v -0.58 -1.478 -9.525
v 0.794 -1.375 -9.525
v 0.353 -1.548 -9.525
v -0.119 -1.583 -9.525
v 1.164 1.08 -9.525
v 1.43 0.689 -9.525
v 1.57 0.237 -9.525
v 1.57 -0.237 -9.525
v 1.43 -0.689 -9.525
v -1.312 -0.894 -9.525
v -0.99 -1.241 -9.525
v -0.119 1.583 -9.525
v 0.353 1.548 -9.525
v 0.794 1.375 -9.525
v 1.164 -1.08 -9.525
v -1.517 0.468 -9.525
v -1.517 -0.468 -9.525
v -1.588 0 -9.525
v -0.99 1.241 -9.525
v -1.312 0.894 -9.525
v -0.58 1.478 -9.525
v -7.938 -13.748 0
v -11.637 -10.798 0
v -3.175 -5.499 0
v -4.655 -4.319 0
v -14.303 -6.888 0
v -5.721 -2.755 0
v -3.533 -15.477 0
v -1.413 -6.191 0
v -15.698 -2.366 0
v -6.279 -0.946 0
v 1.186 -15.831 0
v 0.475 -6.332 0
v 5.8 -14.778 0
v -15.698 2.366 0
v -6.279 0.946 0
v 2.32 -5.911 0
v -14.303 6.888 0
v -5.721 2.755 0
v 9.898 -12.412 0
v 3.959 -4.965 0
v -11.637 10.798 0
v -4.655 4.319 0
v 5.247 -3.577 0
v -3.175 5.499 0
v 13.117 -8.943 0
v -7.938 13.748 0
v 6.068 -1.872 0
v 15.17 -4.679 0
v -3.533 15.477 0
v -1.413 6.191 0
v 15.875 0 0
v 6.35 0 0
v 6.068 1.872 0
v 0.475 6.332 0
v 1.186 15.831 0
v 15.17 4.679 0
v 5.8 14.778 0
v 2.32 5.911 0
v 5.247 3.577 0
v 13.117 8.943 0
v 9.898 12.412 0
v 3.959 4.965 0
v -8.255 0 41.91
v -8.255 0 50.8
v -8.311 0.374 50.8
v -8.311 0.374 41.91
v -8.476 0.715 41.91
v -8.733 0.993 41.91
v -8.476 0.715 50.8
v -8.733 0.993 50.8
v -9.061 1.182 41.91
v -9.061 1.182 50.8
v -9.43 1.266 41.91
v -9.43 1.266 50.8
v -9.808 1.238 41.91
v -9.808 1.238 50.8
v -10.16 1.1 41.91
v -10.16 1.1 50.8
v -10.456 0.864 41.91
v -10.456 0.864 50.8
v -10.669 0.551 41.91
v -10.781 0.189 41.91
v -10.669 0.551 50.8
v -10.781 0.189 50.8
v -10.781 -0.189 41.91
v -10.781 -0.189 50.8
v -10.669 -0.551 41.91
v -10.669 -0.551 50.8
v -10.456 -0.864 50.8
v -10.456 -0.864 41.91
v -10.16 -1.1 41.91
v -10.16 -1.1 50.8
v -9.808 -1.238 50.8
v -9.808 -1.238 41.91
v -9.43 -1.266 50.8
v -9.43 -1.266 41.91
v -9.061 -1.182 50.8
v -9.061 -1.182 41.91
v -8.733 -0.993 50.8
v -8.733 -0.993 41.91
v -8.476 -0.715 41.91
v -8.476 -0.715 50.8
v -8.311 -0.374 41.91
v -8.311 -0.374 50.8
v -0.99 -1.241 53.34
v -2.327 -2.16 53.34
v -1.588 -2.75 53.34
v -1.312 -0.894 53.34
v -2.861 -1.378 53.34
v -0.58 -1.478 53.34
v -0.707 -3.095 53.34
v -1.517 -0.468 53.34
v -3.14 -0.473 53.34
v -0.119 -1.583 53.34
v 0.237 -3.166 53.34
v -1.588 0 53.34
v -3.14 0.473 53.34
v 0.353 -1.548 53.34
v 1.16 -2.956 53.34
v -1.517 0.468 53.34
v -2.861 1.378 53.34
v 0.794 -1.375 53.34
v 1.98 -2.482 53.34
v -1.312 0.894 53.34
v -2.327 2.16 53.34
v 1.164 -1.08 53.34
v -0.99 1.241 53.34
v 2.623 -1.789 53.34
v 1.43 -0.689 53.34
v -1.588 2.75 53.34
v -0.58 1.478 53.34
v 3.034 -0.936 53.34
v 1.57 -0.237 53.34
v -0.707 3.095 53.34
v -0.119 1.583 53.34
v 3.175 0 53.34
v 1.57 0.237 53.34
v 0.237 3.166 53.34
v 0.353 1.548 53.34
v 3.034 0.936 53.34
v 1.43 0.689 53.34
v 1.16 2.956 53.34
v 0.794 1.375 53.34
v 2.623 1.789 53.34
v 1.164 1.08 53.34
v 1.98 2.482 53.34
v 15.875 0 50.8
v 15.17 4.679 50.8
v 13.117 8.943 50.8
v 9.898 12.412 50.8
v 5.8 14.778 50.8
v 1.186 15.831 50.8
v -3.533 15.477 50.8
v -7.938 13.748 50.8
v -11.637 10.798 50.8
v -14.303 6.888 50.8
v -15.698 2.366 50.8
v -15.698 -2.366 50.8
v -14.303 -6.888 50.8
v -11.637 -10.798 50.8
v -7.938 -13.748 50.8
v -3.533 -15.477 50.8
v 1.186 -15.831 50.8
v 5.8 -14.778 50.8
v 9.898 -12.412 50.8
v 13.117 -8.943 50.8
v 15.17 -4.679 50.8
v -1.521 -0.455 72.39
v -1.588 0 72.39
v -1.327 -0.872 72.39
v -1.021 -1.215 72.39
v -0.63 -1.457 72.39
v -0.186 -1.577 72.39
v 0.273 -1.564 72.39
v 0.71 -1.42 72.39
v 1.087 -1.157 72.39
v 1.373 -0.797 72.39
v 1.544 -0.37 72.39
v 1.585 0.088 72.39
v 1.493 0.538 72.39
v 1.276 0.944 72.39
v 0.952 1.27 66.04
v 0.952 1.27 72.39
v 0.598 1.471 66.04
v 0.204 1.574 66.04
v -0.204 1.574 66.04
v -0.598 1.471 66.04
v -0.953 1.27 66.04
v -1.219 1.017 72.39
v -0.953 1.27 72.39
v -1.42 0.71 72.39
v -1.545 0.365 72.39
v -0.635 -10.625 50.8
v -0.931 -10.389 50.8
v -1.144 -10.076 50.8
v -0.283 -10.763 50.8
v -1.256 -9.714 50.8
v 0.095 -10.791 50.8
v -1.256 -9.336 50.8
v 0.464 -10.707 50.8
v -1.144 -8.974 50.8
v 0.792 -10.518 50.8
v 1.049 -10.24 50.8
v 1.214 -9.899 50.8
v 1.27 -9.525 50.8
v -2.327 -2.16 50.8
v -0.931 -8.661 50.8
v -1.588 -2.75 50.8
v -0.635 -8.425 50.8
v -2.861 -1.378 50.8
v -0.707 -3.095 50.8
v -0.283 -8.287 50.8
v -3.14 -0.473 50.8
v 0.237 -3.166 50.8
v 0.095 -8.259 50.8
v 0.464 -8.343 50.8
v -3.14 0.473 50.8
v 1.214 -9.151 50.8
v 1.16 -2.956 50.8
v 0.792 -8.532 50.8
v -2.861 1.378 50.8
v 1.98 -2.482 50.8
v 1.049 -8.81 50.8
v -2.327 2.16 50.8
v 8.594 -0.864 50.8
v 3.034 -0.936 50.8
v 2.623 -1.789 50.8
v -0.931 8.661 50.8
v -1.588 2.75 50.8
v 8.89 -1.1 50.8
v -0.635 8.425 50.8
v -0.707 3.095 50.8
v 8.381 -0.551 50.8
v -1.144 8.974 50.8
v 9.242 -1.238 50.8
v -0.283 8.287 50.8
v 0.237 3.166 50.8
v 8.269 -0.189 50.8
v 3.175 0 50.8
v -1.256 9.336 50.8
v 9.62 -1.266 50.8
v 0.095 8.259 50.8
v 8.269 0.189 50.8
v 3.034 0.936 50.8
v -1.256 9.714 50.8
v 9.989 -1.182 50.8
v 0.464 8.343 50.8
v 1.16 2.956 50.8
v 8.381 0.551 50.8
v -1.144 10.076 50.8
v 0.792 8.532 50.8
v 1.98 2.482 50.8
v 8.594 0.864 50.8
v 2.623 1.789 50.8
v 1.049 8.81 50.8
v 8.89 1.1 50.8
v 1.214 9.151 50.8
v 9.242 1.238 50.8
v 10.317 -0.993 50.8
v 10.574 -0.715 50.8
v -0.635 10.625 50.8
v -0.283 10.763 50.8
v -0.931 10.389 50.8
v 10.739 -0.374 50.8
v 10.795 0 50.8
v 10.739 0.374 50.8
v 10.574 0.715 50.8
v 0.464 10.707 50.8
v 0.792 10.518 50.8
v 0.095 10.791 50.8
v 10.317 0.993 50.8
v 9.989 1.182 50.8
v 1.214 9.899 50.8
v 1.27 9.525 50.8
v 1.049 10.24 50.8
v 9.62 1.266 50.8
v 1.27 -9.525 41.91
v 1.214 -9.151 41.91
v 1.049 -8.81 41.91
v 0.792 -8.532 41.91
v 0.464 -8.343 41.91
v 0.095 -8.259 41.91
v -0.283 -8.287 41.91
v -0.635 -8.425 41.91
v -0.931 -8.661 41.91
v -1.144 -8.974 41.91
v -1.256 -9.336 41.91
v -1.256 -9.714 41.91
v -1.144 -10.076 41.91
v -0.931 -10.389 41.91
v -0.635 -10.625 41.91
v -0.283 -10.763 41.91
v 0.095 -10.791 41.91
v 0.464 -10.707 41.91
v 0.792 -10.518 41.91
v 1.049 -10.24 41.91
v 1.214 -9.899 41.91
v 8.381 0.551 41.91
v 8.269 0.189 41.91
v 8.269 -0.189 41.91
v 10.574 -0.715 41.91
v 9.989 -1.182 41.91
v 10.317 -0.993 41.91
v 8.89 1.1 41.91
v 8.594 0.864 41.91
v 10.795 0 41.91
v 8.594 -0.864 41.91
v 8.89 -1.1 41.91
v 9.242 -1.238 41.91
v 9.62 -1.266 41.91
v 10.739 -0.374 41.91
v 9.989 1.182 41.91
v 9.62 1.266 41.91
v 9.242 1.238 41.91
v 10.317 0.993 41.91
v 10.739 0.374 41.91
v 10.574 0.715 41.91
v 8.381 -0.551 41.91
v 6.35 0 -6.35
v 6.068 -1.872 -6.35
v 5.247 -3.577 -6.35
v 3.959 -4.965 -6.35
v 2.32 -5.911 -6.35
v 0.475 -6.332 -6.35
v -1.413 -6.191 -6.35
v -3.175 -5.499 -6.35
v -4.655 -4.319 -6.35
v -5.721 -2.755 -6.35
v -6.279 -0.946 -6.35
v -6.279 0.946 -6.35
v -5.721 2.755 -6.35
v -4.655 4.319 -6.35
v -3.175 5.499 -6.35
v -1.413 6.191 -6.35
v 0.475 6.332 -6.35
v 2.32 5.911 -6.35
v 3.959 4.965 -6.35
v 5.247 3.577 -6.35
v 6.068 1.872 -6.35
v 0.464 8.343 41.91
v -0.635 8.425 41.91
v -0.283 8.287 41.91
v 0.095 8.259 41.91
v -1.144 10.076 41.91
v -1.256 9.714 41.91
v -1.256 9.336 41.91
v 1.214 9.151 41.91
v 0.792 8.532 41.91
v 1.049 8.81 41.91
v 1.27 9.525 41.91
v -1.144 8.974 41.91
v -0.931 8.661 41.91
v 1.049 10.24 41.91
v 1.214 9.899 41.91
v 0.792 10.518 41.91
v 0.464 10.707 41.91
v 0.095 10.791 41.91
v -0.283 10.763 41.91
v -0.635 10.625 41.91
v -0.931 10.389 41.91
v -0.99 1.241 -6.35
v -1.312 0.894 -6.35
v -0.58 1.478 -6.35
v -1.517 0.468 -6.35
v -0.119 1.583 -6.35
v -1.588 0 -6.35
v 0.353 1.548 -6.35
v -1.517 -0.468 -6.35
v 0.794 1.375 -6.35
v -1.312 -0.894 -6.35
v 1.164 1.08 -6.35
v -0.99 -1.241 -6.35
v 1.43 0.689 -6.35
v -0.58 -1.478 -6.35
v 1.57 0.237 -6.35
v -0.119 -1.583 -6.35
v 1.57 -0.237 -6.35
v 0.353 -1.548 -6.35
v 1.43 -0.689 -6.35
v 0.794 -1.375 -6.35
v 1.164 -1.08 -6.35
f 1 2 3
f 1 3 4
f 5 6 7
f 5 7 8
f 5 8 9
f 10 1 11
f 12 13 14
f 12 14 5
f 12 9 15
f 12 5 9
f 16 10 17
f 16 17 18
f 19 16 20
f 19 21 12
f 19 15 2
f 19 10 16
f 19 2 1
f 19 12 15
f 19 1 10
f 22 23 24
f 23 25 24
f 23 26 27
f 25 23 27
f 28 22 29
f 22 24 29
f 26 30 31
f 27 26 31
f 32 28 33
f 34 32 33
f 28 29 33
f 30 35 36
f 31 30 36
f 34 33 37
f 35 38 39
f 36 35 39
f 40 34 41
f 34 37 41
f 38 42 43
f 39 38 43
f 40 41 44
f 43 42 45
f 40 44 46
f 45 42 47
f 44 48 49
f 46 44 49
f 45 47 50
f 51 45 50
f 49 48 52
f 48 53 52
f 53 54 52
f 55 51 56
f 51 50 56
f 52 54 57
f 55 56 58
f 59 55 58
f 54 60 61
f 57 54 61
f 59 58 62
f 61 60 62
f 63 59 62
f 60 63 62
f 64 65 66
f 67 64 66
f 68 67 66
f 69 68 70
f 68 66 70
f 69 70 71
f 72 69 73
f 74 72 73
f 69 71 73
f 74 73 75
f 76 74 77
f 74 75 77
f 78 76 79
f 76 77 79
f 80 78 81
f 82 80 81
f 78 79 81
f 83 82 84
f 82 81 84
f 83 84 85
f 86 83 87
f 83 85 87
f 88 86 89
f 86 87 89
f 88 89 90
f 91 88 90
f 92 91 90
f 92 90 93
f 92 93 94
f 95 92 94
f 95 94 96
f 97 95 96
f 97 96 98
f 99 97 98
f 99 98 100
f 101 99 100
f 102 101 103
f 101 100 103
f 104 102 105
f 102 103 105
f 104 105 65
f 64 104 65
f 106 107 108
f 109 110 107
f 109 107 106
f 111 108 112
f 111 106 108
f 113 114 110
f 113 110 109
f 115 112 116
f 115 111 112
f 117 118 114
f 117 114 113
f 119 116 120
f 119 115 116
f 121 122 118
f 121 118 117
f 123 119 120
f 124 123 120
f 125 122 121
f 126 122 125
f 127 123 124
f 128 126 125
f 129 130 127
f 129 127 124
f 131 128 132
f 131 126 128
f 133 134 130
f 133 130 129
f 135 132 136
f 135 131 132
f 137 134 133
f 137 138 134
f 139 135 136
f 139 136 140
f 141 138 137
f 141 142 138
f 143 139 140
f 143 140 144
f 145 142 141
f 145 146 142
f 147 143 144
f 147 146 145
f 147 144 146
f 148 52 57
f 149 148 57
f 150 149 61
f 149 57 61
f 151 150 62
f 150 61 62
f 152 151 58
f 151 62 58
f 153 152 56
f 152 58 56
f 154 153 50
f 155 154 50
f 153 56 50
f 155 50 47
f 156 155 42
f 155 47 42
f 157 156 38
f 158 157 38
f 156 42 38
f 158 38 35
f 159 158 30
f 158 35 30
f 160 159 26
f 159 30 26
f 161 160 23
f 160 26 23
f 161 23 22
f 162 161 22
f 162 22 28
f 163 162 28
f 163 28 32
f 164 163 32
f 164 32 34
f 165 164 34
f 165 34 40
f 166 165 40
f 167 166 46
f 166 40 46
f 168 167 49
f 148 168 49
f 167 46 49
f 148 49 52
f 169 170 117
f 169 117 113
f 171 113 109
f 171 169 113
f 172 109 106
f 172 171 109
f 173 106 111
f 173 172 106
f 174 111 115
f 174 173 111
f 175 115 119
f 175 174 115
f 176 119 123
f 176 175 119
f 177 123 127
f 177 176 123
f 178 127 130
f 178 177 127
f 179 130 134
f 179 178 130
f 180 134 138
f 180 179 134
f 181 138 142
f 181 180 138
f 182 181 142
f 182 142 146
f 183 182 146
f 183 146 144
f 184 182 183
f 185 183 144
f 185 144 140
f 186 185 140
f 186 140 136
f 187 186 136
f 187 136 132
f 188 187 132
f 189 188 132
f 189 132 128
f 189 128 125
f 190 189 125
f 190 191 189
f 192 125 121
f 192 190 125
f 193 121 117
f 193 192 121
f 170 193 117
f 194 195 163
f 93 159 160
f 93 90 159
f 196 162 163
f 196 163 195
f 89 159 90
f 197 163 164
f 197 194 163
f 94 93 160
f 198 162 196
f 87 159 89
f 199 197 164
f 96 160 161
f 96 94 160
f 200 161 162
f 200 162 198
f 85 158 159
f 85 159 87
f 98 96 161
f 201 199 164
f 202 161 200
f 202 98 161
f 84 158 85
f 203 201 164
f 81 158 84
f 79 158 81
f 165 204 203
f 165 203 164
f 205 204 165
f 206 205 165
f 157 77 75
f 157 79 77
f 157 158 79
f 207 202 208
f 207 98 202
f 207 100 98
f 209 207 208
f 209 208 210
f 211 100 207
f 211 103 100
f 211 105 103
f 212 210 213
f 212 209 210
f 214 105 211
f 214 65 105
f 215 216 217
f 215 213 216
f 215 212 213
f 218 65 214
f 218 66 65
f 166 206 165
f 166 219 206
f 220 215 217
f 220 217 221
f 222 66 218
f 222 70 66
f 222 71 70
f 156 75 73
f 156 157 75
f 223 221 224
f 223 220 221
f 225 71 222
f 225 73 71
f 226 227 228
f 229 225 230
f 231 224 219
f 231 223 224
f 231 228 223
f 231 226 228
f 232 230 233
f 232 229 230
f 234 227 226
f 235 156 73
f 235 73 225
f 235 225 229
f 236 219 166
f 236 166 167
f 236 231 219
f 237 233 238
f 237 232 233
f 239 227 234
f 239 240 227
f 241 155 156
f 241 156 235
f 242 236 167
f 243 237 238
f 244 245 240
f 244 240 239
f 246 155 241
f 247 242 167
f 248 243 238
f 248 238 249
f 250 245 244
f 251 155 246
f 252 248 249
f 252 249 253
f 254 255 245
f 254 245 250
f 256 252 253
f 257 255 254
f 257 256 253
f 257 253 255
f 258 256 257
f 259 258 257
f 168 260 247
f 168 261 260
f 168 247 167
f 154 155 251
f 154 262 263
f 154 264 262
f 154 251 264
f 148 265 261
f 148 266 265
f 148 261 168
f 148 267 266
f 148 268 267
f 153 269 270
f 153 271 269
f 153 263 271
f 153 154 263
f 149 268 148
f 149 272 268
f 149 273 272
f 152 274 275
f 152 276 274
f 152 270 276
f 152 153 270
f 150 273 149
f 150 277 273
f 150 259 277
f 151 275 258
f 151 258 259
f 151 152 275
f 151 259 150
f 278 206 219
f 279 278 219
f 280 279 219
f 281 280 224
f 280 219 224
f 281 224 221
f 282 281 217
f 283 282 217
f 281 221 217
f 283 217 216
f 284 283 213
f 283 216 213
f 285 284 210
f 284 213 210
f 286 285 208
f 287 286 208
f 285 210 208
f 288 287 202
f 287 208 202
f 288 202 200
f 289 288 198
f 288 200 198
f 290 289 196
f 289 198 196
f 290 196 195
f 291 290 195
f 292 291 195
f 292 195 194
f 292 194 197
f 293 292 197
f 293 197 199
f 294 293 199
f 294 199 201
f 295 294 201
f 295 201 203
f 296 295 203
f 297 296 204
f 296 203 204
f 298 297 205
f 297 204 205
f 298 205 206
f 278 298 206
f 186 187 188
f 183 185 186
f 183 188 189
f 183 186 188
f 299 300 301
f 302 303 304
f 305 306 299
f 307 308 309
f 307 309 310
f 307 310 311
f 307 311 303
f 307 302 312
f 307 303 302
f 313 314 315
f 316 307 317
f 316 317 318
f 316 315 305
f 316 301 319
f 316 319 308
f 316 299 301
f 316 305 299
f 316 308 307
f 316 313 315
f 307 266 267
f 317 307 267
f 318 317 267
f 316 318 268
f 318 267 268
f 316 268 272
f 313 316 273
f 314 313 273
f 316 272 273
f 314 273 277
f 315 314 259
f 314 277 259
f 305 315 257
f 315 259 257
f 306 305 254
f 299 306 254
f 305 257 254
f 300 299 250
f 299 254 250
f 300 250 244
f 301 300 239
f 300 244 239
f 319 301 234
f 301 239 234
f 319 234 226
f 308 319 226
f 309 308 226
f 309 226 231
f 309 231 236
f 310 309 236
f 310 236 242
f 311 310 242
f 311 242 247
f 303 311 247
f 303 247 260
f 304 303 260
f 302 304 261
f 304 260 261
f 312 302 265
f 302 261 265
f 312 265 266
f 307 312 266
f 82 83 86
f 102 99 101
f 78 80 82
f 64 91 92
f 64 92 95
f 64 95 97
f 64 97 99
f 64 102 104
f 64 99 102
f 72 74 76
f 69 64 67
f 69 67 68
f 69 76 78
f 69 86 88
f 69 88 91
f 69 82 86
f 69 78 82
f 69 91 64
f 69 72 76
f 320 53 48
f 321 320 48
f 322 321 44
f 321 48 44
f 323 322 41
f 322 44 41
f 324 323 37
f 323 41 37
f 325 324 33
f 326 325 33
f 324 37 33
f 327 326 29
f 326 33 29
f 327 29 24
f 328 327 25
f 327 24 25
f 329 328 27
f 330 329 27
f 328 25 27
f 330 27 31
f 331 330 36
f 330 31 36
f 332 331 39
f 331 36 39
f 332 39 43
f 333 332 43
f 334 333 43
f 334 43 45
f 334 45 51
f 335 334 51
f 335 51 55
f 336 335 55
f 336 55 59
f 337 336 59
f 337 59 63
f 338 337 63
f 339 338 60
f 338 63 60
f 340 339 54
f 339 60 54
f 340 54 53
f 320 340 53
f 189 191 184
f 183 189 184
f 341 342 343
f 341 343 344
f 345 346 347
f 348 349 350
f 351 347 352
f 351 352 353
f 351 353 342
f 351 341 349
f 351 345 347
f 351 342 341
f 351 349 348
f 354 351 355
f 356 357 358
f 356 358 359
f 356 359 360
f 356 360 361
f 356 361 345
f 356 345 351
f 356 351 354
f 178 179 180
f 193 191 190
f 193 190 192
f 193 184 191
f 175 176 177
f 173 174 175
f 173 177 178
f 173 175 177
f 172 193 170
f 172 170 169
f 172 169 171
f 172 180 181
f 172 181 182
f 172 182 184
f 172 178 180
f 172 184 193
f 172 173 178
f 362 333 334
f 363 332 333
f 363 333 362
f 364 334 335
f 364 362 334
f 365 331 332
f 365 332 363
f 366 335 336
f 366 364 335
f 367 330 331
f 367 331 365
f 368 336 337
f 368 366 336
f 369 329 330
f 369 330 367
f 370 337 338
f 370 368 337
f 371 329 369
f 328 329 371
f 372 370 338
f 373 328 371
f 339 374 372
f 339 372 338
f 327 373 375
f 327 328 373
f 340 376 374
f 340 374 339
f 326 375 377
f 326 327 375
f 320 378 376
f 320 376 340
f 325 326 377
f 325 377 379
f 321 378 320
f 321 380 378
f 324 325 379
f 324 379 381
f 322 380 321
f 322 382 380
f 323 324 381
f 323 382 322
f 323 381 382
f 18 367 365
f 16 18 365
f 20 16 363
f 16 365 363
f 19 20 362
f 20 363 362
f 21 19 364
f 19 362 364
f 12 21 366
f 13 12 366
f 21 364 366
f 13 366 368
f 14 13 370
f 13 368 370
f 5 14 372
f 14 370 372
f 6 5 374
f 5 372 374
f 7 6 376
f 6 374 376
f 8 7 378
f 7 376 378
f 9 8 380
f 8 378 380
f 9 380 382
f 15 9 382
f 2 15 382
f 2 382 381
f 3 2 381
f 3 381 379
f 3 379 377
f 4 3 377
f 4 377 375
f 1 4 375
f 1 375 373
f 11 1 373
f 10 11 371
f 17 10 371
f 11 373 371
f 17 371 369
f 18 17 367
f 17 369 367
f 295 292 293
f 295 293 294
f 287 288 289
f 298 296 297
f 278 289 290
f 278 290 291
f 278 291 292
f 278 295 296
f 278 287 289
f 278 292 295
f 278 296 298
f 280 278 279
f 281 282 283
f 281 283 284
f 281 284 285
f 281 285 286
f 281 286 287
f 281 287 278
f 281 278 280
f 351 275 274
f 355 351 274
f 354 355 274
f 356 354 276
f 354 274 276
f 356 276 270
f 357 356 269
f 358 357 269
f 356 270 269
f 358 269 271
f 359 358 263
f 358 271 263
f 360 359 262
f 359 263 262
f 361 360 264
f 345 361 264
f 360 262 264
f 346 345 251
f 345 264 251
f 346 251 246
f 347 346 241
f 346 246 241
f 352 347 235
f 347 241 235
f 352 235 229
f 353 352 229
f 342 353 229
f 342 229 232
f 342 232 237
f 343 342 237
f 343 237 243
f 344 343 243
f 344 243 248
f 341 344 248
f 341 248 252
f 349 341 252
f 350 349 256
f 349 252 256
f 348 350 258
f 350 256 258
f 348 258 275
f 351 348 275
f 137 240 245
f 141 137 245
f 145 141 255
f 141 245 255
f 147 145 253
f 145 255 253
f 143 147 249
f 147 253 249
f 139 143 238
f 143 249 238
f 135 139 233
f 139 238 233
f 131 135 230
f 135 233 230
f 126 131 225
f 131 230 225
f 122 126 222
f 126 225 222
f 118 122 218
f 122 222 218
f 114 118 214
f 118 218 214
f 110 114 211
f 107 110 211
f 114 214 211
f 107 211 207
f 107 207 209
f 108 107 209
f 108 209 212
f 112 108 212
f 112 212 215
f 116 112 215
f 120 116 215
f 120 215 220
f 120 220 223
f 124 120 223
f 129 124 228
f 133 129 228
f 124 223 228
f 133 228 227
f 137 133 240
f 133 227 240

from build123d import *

# Parameters (mm, degrees)
SKETCH1_R           = 15.875
BOSS_EXTRUDE1_DEPTH = 50.8
SKETCH2_R           = 6.35
BOSS_EXTRUDE2_DEPTH = 6.35
SKETCH3_R           = 1.5875
BOSS_EXTRUDE3_DEPTH = 3.175
SKETCH4_R           = 3.175
BOSS_EXTRUDE4_DEPTH = 2.54
BOSS_EXTRUDE5_START = 19.05
SKETCH5_R           = 1.5875
BOSS_EXTRUDE5_DEPTH = 19.05
CUT_EXTRUDE1_DEPTH  = 6.35
SKETCH7_R           = 1.27
CUT_EXTRUDE2_DEPTH  = 8.89


with BuildPart() as part:
    # Sketch1 → Boss-Extrude1 (new body)
    with BuildSketch(Plane.XY):
        Circle(SKETCH1_R)
    extrude(amount=BOSS_EXTRUDE1_DEPTH)

    # Sketch2 → Boss-Extrude2 (add)
    with BuildSketch(Plane(origin=(0, 0, 0), x_dir=(-1, 0, 0), z_dir=(0, 0, -1))):
        with Locations(Location((0, 0, 0), (0, 0, 180))):
            Circle(SKETCH2_R)
    extrude(amount=BOSS_EXTRUDE2_DEPTH)

    # Sketch3 → Boss-Extrude3 (add)
    with BuildSketch(Plane(origin=(0, 0, -6.35), x_dir=(-1, 0, 0), z_dir=(0, 0, -1))):
        Circle(SKETCH3_R)
    extrude(amount=BOSS_EXTRUDE3_DEPTH)

    # Sketch4 → Boss-Extrude4 (add)
    with BuildSketch(Plane.XY.offset(50.8)):
        Circle(SKETCH4_R)
    extrude(amount=BOSS_EXTRUDE4_DEPTH)

    # Sketch5 → Boss-Extrude5 (add)
    with BuildSketch(Plane.XY.offset(53.34).offset(BOSS_EXTRUDE5_START)):
        with Locations(Location((0, 0, 0), (0, 0, 180))):
            Circle(SKETCH5_R)
    extrude(amount=-BOSS_EXTRUDE5_DEPTH)

    # Sketch6 → Cut-Extrude1 (cut)
    with BuildSketch(Plane.XY.offset(72.39)):
        with BuildLine():
            Line((-0.9525, 1.27), (0.9525, 1.27))
            ThreePointArc((0.9525, 1.27), (0, 1.5875), (-0.9525, 1.27))
        make_face()
    extrude(amount=-CUT_EXTRUDE1_DEPTH, mode=Mode.SUBTRACT)

    # Sketch7 → Cut-Extrude2 (cut)
    with BuildSketch(Plane.XY.offset(50.8)):
        with Locations((0, 9.525)):
            Circle(SKETCH7_R)
        with Locations((9.525, 0)):
            Circle(SKETCH7_R)
        with Locations((0, -9.525)):
            Circle(SKETCH7_R)
        with Locations((-9.525, 0)):
            Circle(SKETCH7_R)
    extrude(amount=-CUT_EXTRUDE2_DEPTH, mode=Mode.SUBTRACT)


solid = part.part
